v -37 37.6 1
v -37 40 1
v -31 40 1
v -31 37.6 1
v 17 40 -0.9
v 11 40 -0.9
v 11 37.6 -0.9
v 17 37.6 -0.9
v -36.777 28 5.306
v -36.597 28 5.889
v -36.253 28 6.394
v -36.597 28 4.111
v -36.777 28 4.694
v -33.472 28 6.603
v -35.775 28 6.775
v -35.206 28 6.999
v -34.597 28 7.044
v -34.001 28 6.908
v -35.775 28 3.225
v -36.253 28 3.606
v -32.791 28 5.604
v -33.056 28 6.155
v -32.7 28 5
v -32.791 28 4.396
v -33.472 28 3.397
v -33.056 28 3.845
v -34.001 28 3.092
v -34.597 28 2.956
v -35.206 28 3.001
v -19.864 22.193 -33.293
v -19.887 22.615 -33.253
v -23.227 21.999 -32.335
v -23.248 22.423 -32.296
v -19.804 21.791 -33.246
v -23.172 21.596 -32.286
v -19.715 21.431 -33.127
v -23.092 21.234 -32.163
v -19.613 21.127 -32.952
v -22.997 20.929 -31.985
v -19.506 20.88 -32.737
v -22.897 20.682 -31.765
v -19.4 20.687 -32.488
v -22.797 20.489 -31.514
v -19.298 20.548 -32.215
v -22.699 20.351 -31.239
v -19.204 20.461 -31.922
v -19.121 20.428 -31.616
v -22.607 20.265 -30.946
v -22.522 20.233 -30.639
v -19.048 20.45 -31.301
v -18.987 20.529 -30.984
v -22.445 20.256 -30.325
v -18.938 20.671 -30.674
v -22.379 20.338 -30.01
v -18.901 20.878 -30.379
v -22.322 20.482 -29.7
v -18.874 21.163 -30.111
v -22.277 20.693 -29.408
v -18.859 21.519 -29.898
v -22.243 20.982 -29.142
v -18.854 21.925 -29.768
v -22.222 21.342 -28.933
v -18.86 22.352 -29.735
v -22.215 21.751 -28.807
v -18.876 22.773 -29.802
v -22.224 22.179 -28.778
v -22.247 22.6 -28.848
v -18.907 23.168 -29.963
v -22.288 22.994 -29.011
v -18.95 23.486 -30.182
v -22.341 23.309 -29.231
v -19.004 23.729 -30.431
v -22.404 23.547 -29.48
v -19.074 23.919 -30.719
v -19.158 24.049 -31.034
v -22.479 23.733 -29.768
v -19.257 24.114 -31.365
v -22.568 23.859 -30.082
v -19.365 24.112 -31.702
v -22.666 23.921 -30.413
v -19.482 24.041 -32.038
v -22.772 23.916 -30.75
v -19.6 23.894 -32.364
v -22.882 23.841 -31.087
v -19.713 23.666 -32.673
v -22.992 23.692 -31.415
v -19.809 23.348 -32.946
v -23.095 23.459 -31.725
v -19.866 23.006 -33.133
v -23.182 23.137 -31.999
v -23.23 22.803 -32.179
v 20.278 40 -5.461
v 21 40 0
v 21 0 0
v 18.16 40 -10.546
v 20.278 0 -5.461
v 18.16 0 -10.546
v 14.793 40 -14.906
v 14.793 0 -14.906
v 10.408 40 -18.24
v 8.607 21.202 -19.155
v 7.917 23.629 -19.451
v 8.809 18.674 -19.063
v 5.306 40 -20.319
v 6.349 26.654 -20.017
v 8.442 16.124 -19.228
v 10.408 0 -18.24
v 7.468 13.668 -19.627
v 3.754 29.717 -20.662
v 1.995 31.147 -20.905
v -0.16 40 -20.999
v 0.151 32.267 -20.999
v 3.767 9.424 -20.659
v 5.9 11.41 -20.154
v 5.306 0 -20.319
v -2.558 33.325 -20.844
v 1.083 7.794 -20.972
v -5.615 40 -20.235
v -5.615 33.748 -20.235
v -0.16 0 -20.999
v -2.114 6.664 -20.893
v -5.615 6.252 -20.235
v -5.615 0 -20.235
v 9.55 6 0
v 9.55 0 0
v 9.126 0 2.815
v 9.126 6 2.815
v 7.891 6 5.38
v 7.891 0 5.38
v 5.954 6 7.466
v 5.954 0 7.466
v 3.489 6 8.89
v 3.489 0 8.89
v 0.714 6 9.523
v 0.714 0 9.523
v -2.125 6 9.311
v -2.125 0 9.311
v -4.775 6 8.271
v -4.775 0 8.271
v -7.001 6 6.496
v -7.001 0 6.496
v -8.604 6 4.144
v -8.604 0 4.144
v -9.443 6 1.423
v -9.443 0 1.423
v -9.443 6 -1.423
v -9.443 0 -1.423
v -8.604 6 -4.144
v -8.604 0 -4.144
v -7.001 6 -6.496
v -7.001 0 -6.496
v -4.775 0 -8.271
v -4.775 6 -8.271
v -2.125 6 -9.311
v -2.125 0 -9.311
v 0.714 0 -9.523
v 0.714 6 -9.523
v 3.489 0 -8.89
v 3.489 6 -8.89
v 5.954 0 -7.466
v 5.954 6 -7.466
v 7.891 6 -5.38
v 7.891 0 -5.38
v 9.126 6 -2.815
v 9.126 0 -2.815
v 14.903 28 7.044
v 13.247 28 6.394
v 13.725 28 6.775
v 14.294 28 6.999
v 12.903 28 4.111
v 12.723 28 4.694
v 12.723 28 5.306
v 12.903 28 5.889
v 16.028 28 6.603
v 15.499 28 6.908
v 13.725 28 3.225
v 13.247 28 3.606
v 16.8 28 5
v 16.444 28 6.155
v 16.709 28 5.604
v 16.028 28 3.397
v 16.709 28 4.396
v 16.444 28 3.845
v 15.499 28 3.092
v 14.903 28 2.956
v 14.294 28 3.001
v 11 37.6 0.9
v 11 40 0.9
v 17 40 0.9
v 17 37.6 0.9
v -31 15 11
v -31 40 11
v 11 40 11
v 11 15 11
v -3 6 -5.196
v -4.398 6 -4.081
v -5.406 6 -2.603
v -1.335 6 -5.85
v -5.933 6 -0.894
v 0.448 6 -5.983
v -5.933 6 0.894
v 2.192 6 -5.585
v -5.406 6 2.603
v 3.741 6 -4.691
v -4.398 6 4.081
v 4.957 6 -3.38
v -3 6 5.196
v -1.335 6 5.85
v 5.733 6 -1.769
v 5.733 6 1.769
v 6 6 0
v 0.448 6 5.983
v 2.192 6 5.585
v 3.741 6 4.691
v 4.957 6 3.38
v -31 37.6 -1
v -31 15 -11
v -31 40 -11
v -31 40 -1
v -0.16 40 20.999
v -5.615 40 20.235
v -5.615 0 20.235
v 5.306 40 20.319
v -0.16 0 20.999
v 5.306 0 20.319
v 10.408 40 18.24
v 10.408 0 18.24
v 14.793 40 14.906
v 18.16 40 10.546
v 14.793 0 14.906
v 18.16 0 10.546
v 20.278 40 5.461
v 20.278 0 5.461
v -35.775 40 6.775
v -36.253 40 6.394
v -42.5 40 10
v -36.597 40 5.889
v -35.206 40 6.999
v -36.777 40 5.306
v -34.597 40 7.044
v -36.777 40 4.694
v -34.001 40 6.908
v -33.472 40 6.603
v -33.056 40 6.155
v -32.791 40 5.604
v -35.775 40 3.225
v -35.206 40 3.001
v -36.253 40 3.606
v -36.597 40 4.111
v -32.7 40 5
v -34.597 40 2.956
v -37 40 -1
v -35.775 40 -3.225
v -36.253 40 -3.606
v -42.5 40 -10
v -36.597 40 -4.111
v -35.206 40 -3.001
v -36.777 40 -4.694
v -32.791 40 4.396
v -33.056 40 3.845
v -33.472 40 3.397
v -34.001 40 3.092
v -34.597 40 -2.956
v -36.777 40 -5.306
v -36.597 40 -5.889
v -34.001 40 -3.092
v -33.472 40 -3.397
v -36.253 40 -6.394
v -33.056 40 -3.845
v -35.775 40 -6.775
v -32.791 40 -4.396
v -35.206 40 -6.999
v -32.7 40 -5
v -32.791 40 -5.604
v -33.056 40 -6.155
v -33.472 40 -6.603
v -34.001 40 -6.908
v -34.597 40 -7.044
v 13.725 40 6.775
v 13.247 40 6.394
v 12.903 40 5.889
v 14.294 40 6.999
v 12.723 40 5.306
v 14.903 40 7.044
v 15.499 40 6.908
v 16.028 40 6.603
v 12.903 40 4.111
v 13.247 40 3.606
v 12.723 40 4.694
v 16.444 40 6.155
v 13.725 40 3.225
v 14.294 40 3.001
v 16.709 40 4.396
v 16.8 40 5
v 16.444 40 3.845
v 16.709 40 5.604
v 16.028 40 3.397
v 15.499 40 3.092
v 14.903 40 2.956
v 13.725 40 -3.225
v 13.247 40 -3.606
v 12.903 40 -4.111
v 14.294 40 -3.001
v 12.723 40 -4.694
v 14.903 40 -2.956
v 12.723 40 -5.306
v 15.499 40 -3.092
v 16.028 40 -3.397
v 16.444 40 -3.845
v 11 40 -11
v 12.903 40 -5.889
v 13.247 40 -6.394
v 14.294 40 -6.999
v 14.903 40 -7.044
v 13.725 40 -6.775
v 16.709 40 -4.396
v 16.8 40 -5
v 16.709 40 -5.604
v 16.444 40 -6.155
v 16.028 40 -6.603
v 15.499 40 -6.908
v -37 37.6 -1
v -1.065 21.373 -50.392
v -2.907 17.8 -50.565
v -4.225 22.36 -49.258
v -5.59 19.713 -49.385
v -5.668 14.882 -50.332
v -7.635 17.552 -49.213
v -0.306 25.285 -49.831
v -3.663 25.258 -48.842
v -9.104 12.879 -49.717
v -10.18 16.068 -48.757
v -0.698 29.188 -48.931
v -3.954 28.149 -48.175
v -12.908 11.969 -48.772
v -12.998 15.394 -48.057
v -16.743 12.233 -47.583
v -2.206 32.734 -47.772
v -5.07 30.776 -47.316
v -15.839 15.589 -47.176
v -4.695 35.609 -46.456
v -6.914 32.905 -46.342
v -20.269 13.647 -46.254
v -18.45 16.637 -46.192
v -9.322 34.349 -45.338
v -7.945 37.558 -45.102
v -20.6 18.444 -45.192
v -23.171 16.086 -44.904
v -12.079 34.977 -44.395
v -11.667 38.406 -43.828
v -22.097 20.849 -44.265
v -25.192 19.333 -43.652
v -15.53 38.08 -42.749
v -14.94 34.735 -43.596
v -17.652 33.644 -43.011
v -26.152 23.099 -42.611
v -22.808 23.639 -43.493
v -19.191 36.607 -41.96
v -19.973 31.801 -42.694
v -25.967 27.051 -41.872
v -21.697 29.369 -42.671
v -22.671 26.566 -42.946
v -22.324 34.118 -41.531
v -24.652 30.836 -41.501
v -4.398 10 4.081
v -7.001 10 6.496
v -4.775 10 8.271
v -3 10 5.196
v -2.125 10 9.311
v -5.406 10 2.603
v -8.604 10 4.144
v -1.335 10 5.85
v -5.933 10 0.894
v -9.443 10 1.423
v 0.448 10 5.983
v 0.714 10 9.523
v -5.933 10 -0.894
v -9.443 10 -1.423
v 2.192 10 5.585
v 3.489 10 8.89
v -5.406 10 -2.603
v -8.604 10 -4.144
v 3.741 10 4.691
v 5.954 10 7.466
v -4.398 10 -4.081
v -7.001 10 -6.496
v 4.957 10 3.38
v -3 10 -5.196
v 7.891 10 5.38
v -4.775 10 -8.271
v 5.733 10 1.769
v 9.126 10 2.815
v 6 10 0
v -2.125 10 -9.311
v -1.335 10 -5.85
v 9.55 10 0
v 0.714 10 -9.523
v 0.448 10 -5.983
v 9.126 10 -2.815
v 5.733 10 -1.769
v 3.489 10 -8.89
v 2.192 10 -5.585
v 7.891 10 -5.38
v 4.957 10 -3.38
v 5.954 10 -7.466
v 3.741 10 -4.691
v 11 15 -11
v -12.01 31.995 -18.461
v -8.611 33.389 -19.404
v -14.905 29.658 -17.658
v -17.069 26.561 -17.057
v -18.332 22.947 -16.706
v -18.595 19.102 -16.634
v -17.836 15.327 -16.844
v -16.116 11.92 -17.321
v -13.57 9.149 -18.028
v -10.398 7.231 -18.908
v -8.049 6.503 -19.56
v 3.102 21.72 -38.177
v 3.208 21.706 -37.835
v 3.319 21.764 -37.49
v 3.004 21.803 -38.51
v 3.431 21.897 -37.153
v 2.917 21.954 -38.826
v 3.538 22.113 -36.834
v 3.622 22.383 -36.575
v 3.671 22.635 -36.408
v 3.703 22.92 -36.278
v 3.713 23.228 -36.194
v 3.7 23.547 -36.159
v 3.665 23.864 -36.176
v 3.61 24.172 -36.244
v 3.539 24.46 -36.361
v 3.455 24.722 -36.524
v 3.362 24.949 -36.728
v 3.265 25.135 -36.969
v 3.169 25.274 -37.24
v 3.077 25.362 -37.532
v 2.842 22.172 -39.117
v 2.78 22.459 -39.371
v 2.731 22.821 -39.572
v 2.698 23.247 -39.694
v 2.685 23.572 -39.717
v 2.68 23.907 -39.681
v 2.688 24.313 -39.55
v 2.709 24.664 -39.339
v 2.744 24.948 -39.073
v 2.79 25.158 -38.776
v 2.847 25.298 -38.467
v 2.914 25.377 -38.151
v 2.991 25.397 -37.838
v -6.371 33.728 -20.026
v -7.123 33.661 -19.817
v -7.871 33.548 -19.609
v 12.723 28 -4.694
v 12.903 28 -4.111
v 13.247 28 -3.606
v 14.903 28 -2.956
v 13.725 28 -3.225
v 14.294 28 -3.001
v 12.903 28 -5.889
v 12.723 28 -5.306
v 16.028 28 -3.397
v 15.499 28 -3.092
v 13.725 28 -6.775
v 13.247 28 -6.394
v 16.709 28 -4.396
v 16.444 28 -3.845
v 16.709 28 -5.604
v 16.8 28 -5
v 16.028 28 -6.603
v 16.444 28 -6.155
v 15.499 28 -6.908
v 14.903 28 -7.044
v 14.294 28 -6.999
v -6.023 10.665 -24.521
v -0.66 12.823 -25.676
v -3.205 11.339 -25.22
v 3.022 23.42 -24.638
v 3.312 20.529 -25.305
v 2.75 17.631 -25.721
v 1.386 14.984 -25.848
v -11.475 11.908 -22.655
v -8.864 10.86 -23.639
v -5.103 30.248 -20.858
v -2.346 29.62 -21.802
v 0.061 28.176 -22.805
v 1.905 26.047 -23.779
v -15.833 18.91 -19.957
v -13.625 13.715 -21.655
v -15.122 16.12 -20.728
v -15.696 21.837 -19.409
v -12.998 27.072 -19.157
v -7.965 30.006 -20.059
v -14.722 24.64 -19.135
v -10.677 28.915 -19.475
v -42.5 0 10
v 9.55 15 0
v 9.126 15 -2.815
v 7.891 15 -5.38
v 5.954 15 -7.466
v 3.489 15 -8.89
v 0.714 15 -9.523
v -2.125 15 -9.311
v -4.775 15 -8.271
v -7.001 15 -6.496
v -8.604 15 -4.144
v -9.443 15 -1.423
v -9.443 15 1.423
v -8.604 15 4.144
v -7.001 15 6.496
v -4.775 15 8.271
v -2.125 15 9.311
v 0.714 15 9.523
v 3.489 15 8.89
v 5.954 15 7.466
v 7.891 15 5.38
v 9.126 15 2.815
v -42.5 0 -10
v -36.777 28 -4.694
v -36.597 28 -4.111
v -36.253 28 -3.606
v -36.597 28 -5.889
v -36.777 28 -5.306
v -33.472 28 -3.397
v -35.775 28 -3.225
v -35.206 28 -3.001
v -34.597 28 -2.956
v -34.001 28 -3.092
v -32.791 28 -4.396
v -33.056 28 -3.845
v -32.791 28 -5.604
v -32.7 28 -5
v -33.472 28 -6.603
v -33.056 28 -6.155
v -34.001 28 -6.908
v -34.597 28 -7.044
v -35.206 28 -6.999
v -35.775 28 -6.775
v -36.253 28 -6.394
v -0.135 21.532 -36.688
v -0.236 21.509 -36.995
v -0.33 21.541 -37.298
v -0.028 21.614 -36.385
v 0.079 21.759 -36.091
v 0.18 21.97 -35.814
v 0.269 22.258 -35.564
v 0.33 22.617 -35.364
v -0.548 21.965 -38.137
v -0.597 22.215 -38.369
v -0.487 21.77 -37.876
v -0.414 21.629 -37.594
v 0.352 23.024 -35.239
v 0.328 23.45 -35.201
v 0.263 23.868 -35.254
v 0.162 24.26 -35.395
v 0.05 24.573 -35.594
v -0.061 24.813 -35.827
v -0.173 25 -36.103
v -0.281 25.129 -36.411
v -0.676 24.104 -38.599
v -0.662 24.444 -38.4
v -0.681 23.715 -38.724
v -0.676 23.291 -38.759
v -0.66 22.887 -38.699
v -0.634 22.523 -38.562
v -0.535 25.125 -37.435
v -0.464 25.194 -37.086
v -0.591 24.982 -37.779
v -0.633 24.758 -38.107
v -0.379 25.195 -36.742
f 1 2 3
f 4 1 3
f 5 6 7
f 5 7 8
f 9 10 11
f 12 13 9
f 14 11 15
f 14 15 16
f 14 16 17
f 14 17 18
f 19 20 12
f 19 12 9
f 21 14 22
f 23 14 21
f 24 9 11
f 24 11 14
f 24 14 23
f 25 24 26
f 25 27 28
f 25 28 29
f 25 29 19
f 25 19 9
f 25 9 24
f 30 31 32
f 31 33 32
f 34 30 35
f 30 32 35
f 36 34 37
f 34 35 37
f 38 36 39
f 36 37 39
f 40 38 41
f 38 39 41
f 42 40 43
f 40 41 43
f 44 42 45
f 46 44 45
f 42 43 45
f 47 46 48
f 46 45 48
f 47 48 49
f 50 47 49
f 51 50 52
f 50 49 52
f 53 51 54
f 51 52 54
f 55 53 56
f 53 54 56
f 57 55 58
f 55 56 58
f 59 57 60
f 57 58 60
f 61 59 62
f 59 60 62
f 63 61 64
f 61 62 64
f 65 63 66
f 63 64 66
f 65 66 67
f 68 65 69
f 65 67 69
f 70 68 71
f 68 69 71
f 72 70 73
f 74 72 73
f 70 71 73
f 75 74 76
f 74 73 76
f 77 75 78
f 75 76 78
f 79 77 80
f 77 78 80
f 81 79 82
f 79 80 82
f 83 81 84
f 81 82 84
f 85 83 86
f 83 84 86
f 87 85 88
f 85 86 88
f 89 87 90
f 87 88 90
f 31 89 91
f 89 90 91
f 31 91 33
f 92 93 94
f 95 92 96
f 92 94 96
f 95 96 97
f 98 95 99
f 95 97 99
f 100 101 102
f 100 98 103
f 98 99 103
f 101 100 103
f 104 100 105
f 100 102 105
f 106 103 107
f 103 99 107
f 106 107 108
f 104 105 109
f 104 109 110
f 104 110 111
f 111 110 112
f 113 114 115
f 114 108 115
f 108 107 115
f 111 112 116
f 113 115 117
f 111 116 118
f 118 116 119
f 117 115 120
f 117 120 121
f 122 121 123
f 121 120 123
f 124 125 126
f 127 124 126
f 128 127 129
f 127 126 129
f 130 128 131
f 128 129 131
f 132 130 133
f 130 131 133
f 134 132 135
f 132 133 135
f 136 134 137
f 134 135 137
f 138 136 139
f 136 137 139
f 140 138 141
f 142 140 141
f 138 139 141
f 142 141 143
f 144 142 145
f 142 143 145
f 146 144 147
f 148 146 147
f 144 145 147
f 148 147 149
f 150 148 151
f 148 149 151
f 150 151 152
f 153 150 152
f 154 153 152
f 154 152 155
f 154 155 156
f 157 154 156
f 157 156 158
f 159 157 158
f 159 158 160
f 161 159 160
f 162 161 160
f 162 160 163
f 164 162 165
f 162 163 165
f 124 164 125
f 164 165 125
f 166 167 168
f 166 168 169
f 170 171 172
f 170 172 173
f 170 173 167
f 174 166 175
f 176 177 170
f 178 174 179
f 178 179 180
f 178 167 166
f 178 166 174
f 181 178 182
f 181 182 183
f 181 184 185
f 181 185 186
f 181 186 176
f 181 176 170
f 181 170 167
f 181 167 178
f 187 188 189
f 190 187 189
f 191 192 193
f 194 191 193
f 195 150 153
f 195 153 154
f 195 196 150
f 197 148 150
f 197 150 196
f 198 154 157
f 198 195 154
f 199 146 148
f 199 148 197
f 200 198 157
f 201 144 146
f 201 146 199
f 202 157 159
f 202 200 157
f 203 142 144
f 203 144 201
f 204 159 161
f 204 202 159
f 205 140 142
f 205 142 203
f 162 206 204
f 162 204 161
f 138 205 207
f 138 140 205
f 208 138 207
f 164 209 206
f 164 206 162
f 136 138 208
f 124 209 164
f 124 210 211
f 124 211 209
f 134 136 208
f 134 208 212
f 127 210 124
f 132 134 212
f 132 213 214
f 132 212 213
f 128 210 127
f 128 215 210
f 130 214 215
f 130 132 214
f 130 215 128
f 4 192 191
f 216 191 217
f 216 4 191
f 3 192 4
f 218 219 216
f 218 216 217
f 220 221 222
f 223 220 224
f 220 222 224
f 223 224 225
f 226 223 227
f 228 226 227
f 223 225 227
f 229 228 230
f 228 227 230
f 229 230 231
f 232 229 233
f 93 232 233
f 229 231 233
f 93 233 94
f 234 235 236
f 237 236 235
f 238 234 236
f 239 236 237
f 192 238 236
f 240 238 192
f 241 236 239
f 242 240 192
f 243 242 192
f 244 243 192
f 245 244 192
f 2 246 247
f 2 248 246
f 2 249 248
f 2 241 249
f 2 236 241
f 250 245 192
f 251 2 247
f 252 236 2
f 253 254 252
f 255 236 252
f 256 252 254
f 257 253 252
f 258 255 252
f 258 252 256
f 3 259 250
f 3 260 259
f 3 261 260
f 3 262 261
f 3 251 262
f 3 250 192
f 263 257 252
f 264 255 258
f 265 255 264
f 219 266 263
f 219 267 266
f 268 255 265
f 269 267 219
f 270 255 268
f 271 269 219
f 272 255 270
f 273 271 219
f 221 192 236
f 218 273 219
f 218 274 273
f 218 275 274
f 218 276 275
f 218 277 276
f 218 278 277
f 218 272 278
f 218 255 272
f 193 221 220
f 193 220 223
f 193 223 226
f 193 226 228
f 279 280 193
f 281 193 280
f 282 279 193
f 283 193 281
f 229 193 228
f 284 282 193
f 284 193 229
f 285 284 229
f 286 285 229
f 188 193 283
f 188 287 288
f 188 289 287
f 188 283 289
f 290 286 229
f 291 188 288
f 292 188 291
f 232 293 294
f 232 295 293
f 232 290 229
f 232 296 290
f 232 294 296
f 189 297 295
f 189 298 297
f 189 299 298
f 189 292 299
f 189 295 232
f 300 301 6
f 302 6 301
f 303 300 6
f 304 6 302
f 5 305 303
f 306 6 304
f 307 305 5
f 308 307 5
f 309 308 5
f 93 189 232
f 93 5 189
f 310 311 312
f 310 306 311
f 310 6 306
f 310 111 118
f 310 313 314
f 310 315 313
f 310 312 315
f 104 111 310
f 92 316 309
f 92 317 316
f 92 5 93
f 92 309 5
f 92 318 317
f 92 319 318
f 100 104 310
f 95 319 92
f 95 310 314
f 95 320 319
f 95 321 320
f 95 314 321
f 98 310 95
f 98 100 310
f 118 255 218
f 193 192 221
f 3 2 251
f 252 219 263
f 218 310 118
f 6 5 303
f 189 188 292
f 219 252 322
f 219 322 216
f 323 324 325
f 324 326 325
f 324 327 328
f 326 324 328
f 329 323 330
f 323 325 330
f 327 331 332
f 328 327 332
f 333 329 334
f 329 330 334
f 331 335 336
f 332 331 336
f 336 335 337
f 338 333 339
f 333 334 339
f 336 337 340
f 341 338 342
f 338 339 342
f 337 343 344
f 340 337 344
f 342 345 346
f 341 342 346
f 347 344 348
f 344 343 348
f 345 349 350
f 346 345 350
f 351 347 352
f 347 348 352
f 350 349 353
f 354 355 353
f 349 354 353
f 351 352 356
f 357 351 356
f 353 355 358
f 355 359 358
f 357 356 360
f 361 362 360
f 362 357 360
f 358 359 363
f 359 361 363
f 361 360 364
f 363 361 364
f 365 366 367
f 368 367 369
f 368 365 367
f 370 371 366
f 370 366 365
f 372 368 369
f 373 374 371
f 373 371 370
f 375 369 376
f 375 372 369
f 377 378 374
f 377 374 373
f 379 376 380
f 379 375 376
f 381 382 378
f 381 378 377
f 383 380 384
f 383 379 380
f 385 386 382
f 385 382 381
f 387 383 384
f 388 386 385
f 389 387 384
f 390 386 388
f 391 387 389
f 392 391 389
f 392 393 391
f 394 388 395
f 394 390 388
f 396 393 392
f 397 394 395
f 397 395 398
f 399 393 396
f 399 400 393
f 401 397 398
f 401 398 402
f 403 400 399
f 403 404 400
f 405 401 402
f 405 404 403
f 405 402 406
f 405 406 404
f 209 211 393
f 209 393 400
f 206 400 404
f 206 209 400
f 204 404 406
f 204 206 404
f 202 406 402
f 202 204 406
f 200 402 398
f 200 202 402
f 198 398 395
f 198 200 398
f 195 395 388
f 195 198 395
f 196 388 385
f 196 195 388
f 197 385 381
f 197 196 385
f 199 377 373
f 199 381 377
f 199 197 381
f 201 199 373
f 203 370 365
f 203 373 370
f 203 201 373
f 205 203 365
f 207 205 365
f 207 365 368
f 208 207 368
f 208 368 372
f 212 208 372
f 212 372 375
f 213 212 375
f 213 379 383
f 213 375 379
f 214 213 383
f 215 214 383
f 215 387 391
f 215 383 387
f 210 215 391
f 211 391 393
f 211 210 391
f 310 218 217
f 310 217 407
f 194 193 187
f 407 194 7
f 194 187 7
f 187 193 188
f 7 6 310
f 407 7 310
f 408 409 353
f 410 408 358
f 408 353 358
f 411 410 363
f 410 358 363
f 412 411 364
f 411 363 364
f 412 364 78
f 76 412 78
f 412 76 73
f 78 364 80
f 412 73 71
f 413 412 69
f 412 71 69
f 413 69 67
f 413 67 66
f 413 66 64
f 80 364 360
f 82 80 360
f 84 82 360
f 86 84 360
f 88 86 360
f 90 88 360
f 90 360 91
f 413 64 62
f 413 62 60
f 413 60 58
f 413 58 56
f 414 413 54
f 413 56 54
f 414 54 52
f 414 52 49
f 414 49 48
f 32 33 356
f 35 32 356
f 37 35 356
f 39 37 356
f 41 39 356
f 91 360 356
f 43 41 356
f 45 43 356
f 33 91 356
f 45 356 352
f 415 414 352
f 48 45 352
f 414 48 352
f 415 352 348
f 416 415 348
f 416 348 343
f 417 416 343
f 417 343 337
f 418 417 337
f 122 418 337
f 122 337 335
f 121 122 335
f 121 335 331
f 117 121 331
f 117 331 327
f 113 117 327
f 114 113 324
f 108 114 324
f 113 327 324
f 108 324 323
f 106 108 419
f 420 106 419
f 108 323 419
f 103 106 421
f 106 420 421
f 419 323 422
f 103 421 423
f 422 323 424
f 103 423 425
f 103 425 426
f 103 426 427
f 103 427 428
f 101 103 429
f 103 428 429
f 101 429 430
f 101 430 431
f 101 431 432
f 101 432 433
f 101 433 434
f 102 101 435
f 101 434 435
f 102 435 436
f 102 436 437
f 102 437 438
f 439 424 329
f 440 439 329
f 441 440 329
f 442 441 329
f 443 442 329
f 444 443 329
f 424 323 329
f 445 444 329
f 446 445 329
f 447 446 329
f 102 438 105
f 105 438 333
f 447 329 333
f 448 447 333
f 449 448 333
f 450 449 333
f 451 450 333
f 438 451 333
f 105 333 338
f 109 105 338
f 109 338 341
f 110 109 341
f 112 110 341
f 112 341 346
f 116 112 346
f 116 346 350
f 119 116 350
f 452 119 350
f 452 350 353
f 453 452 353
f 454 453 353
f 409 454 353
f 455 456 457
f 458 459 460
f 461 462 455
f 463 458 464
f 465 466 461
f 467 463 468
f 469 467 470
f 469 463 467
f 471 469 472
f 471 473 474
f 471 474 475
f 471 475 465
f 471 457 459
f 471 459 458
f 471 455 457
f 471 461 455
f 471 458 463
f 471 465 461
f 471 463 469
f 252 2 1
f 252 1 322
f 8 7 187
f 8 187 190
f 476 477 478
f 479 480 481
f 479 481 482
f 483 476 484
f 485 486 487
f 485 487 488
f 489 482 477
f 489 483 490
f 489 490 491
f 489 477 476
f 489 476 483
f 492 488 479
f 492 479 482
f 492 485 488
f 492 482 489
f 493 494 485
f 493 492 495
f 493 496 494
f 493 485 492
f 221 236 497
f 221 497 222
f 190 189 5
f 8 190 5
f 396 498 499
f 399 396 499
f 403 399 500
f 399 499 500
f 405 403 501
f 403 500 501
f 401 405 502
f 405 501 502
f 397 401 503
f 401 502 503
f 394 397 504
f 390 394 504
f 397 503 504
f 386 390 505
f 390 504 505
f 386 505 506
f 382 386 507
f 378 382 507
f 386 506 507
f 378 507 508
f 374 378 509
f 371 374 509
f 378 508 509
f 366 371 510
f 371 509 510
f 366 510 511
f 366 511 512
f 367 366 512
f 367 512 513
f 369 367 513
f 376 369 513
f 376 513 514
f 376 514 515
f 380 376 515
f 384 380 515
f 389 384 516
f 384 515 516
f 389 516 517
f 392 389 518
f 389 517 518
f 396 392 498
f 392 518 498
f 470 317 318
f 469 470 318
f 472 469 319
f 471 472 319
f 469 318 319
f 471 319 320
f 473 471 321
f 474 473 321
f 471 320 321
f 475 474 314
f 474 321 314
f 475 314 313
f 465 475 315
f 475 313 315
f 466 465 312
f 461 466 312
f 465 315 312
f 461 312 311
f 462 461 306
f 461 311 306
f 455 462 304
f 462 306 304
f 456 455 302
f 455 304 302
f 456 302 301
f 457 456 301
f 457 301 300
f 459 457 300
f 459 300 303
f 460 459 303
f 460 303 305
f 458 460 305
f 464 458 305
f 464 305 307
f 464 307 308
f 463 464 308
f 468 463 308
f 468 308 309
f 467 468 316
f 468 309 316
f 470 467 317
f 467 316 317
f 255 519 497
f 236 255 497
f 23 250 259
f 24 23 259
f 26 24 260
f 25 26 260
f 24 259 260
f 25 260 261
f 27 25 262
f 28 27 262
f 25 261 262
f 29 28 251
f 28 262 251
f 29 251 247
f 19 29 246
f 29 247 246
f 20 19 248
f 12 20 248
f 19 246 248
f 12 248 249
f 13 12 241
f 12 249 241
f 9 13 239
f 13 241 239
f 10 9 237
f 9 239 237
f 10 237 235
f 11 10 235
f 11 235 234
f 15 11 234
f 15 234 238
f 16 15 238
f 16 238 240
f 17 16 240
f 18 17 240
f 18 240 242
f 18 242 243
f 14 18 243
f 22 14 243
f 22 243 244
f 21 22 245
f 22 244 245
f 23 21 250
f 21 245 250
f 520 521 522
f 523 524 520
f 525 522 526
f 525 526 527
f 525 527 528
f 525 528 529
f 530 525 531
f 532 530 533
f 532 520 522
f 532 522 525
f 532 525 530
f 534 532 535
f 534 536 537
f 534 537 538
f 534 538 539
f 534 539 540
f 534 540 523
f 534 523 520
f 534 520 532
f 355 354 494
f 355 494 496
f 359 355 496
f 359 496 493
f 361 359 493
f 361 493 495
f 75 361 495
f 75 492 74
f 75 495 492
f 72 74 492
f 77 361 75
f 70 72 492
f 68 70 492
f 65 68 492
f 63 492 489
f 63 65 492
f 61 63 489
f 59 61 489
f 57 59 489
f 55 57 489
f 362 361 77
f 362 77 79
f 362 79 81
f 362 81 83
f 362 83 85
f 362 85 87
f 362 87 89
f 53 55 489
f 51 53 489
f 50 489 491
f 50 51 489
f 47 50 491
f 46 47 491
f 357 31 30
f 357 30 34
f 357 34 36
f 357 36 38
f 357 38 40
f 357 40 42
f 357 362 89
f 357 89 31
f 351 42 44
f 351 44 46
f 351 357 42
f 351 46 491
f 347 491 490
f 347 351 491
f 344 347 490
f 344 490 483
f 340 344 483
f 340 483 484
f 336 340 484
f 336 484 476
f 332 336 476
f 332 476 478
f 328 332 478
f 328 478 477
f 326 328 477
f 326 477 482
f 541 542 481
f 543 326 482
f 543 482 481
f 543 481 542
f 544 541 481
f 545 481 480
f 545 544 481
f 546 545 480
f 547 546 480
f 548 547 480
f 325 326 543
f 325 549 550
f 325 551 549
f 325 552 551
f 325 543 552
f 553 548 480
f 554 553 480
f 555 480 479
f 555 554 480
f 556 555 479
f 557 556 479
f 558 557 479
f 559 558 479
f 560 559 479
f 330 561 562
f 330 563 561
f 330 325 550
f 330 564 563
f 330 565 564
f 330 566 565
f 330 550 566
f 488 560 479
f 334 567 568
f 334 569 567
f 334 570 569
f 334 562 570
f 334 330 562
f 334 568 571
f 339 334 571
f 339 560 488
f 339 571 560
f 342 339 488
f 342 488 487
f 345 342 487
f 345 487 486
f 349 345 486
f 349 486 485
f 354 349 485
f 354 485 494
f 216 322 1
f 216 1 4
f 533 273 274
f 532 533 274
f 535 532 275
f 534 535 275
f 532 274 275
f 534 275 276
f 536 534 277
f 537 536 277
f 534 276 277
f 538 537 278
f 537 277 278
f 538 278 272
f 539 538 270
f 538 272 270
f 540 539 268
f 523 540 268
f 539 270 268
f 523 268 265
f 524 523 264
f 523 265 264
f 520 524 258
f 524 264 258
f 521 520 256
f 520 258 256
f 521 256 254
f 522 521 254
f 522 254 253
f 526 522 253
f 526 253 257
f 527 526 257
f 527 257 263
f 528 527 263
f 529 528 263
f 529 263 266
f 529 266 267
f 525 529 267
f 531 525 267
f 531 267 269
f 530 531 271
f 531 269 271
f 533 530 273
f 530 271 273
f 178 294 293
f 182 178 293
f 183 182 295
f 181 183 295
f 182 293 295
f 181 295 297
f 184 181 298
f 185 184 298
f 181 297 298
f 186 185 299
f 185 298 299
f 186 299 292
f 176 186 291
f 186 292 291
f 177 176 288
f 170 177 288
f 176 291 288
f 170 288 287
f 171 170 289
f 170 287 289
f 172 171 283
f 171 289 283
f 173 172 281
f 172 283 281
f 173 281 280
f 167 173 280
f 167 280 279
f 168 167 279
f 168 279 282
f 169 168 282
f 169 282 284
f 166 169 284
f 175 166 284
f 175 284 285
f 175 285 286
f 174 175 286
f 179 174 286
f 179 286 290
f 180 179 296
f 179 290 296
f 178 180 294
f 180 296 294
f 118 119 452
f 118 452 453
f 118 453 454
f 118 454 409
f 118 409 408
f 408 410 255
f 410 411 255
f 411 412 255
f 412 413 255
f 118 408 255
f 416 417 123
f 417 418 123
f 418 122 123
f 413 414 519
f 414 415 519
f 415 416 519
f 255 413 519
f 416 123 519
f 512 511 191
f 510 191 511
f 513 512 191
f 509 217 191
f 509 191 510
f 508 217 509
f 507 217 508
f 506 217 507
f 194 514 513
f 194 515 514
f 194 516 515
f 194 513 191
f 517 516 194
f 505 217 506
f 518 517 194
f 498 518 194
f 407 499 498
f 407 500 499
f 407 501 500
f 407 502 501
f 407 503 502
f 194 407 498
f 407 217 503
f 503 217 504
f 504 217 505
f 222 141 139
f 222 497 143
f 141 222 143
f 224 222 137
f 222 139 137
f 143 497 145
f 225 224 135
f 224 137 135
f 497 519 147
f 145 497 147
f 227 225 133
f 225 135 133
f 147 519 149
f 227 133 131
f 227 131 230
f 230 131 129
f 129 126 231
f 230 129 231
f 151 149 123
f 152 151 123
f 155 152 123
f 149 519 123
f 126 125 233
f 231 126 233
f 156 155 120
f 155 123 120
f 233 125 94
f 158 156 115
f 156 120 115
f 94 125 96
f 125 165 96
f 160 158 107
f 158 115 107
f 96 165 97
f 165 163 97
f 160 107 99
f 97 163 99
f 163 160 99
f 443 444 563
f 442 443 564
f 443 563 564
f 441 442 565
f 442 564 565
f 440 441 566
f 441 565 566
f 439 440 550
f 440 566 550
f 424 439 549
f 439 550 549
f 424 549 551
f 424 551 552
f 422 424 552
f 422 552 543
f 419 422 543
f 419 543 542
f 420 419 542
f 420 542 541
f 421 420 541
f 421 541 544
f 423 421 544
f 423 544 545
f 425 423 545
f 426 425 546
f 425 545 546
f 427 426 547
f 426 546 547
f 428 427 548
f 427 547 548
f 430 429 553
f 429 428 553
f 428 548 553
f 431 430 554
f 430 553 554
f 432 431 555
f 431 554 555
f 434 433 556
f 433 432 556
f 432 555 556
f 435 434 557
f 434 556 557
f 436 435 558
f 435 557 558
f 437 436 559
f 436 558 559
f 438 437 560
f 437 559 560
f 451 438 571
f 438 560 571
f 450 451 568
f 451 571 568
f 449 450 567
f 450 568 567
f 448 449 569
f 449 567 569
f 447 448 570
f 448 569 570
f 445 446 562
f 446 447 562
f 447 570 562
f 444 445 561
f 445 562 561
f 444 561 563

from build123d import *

# Parameters (mm, degrees)
SKETCH1_W           = 7.25
SKETCH1_H           = 20
SKETCH1_R           = 6
BOSS_EXTRUDE1_DEPTH = 40
SKETCH2_W           = 42
SKETCH2_H           = 22
CUT_EXTRUDE1_DEPTH  = 25
SKETCH3_R           = 2.05
CUT_EXTRUDE2_DEPTH  = 12
SKETCH4_R           = 9.55
CUT_EXTRUDE3_DEPTH  = 5
SKETCH5_R           = 9.55
CUT_EXTRUDE4_DEPTH  = 6
SKETCH7_W           = 6
SKETCH7_H           = 2
SKETCH7_H_2         = 1.8
CUT_EXTRUDE5_DEPTH  = 2.4
BOSS_EXTRUDE3_REACH = 79.413
SKETCH10_R          = 13.5
SKETCH10_R_2        = 10
BOSS_EXTRUDE4_REACH = 54.413
SKETCH11_R          = 10
SKETCH15_R          = 1.85
CUT_EXTRUDE8_DEPTH  = 13.5


with BuildPart() as part:
    # Sketch1 → Boss-Extrude1 (new body)
    with BuildSketch(Plane(origin=(0, 0, 0), x_dir=(1, 0, 0), z_dir=(0, 1, 0))):
        with BuildLine():
            Line((-30.25, -10), (-37.5, -10))
            Line((-37.5, -10), (-37.5, 10))
            Line((-37.5, 10), (-30.25, 10))
            Line((-30.25, 10), (-18.466185313, 10))
            ThreePointArc((-18.466185313, 10), (-13.083157843, 16.426532831), (-5.61521172, 20.235350191))
            Line((-5.61521172, 20.235350191), (-42.5, 10))
            Line((-42.5, 10), (-42.5, -10))
            Line((-42.5, -10), (-5.61521172, -20.235350191))
            ThreePointArc((-5.61521172, -20.235350191), (-13.083157843, -16.426532831), (-18.466185313, -10))
            Line((-18.466185313, -10), (-30.25, -10))
        make_face()
        with Locations((-33.875, 0)):
            Rectangle(SKETCH1_W, SKETCH1_H)
        with BuildLine():
            ThreePointArc((-18.466185313, 10), (-21, 0), (-18.466185313, -10))
            Line((-18.466185313, -10), (9.75, -10))
            Line((9.75, -10), (9.75, 10))
            Line((9.75, 10), (-18.466185313, 10))
        make_face()
        Circle(SKETCH1_R, mode=Mode.SUBTRACT)
        with BuildLine():
            Line((-30.25, 10), (-30.25, -10))
            Line((-30.25, -10), (-18.466185313, -10))
            ThreePointArc((-18.466185313, -10), (-21, 0), (-18.466185313, 10))
            Line((-18.466185313, 10), (-30.25, 10))
        make_face()
        with BuildLine():
            Line((9.75, -10), (-18.466185313, -10))
            ThreePointArc((-18.466185313, -10), (-13.083157843, -16.426532831), (-5.61521172, -20.235350191))
            ThreePointArc((-5.61521172, -20.235350191), (12.709849603, -16.717048874), (21, 0))
            ThreePointArc((21, 0), (12.709849603, 16.717048874), (-5.61521172, 20.235350191))
            ThreePointArc((-5.61521172, 20.235350191), (-13.083157843, 16.426532831), (-18.466185313, 10))
            Line((-18.466185313, 10), (9.75, 10))
            Line((9.75, 10), (17, 10))
            Line((17, 10), (17, -10))
            Line((17, -10), (9.75, -10))
        make_face()
        with Locations((13.375, 0)):
            Rectangle(SKETCH1_W, SKETCH1_H)
    extrude(amount=BOSS_EXTRUDE1_DEPTH)

    # Sketch2 → Cut-Extrude1 (cut)
    with BuildSketch(Plane(origin=(0, 40, 0), x_dir=(1, 0, 0), z_dir=(0, 1, 0))):
        with Locations((-10, 0)):
            Rectangle(SKETCH2_W, SKETCH2_H)
    extrude(amount=-CUT_EXTRUDE1_DEPTH, mode=Mode.SUBTRACT)

    # Sketch3 → Cut-Extrude2 (cut)
    with BuildSketch(Plane(origin=(0, 40, 0), x_dir=(1, 0, 0), z_dir=(0, 1, 0))):
        with Locations((14.75, 5)):
            Circle(SKETCH3_R)
        with Locations((14.75, -5)):
            Circle(SKETCH3_R)
        with Locations((-34.75, 5)):
            Circle(SKETCH3_R)
        with Locations((-34.75, -5)):
            Circle(SKETCH3_R)
    extrude(amount=-CUT_EXTRUDE2_DEPTH, mode=Mode.SUBTRACT)

    # Sketch4 → Cut-Extrude3 (cut)
    with BuildSketch(Plane(origin=(0, 15, 0), x_dir=(1, 0, 0), z_dir=(0, 1, 0))):
        Circle(SKETCH4_R)
    extrude(amount=-CUT_EXTRUDE3_DEPTH, mode=Mode.SUBTRACT)

    # Sketch5 → Cut-Extrude4 (cut)
    with BuildSketch(Plane.XZ):
        Circle(SKETCH5_R)
    extrude(amount=-CUT_EXTRUDE4_DEPTH, mode=Mode.SUBTRACT)

    # Sketch7 → Cut-Extrude5 (cut)
    with BuildSketch(Plane(origin=(0, 40, 0), x_dir=(1, 0, 0), z_dir=(0, 1, 0))):
        with Locations((-34, 0)):
            Rectangle(SKETCH7_W, SKETCH7_H)
        with Locations((14, 0)):
            Rectangle(SKETCH7_W, SKETCH7_H_2)
    extrude(amount=-CUT_EXTRUDE5_DEPTH, mode=Mode.SUBTRACT)

    # Sketch10 → Boss-Extrude3 (add, up to next)
    with BuildSketch(Plane(origin=(-14.44792881, 9.795327955, -48.752531942), x_dir=(-0.168490085, 0.955554754, 0.241921896), z_dir=(0.279007999, -0.189160321, 0.941473796)), mode=Mode.PRIVATE) as boss_extrude3_sk1:
        with Locations((15.161828301, -3.96392858)):
            Circle(SKETCH10_R)
        with Locations((15.161828301, -3.96392858)):
            Circle(SKETCH10_R_2, mode=Mode.SUBTRACT)
    boss_extrude3_tool1 = extrude(boss_extrude3_sk1.sketch, amount=BOSS_EXTRUDE3_REACH, mode=Mode.PRIVATE) - part.part
    add(boss_extrude3_tool1.solids().sort_by_distance((-11.044801, 12.644515, -49.1886))[0])

    # Sketch11 → Boss-Extrude4 (add, up to next)
    with BuildSketch(Plane(origin=(-7.472728833, 5.066319927, -25.215687031), x_dir=(-0.960288778, -0.054959762, 0.273541383), z_dir=(-0.279007999, 0.189160321, -0.941473796)), mode=Mode.PRIVATE) as boss_extrude4_sk1:
        with Locations((-1.242176115, 15.622124238)):
            Circle(SKETCH11_R)
    boss_extrude4_tool1 = extrude(boss_extrude4_sk1.sketch, amount=-BOSS_EXTRUDE4_REACH, mode=Mode.PRIVATE) - part.part
    add(boss_extrude4_tool1.solids().sort_by_distance((-6.279881, 20.450629, -22.478185))[0])

    # Sketch15 → Cut-Extrude8 (cut, symmetric)
    with BuildSketch(Plane(origin=(1.192847783, 0.068269704, -0.339786572), x_dir=(-0.279007999, 0.189160321, -0.941473796), z_dir=(-0.960288778, -0.054959762, 0.273541383))):
        with Locations((39.283206422, -15.622124238)):
            Circle(SKETCH15_R)
    extrude(amount=CUT_EXTRUDE8_DEPTH, both=True, mode=Mode.SUBTRACT)


solid = part.part
